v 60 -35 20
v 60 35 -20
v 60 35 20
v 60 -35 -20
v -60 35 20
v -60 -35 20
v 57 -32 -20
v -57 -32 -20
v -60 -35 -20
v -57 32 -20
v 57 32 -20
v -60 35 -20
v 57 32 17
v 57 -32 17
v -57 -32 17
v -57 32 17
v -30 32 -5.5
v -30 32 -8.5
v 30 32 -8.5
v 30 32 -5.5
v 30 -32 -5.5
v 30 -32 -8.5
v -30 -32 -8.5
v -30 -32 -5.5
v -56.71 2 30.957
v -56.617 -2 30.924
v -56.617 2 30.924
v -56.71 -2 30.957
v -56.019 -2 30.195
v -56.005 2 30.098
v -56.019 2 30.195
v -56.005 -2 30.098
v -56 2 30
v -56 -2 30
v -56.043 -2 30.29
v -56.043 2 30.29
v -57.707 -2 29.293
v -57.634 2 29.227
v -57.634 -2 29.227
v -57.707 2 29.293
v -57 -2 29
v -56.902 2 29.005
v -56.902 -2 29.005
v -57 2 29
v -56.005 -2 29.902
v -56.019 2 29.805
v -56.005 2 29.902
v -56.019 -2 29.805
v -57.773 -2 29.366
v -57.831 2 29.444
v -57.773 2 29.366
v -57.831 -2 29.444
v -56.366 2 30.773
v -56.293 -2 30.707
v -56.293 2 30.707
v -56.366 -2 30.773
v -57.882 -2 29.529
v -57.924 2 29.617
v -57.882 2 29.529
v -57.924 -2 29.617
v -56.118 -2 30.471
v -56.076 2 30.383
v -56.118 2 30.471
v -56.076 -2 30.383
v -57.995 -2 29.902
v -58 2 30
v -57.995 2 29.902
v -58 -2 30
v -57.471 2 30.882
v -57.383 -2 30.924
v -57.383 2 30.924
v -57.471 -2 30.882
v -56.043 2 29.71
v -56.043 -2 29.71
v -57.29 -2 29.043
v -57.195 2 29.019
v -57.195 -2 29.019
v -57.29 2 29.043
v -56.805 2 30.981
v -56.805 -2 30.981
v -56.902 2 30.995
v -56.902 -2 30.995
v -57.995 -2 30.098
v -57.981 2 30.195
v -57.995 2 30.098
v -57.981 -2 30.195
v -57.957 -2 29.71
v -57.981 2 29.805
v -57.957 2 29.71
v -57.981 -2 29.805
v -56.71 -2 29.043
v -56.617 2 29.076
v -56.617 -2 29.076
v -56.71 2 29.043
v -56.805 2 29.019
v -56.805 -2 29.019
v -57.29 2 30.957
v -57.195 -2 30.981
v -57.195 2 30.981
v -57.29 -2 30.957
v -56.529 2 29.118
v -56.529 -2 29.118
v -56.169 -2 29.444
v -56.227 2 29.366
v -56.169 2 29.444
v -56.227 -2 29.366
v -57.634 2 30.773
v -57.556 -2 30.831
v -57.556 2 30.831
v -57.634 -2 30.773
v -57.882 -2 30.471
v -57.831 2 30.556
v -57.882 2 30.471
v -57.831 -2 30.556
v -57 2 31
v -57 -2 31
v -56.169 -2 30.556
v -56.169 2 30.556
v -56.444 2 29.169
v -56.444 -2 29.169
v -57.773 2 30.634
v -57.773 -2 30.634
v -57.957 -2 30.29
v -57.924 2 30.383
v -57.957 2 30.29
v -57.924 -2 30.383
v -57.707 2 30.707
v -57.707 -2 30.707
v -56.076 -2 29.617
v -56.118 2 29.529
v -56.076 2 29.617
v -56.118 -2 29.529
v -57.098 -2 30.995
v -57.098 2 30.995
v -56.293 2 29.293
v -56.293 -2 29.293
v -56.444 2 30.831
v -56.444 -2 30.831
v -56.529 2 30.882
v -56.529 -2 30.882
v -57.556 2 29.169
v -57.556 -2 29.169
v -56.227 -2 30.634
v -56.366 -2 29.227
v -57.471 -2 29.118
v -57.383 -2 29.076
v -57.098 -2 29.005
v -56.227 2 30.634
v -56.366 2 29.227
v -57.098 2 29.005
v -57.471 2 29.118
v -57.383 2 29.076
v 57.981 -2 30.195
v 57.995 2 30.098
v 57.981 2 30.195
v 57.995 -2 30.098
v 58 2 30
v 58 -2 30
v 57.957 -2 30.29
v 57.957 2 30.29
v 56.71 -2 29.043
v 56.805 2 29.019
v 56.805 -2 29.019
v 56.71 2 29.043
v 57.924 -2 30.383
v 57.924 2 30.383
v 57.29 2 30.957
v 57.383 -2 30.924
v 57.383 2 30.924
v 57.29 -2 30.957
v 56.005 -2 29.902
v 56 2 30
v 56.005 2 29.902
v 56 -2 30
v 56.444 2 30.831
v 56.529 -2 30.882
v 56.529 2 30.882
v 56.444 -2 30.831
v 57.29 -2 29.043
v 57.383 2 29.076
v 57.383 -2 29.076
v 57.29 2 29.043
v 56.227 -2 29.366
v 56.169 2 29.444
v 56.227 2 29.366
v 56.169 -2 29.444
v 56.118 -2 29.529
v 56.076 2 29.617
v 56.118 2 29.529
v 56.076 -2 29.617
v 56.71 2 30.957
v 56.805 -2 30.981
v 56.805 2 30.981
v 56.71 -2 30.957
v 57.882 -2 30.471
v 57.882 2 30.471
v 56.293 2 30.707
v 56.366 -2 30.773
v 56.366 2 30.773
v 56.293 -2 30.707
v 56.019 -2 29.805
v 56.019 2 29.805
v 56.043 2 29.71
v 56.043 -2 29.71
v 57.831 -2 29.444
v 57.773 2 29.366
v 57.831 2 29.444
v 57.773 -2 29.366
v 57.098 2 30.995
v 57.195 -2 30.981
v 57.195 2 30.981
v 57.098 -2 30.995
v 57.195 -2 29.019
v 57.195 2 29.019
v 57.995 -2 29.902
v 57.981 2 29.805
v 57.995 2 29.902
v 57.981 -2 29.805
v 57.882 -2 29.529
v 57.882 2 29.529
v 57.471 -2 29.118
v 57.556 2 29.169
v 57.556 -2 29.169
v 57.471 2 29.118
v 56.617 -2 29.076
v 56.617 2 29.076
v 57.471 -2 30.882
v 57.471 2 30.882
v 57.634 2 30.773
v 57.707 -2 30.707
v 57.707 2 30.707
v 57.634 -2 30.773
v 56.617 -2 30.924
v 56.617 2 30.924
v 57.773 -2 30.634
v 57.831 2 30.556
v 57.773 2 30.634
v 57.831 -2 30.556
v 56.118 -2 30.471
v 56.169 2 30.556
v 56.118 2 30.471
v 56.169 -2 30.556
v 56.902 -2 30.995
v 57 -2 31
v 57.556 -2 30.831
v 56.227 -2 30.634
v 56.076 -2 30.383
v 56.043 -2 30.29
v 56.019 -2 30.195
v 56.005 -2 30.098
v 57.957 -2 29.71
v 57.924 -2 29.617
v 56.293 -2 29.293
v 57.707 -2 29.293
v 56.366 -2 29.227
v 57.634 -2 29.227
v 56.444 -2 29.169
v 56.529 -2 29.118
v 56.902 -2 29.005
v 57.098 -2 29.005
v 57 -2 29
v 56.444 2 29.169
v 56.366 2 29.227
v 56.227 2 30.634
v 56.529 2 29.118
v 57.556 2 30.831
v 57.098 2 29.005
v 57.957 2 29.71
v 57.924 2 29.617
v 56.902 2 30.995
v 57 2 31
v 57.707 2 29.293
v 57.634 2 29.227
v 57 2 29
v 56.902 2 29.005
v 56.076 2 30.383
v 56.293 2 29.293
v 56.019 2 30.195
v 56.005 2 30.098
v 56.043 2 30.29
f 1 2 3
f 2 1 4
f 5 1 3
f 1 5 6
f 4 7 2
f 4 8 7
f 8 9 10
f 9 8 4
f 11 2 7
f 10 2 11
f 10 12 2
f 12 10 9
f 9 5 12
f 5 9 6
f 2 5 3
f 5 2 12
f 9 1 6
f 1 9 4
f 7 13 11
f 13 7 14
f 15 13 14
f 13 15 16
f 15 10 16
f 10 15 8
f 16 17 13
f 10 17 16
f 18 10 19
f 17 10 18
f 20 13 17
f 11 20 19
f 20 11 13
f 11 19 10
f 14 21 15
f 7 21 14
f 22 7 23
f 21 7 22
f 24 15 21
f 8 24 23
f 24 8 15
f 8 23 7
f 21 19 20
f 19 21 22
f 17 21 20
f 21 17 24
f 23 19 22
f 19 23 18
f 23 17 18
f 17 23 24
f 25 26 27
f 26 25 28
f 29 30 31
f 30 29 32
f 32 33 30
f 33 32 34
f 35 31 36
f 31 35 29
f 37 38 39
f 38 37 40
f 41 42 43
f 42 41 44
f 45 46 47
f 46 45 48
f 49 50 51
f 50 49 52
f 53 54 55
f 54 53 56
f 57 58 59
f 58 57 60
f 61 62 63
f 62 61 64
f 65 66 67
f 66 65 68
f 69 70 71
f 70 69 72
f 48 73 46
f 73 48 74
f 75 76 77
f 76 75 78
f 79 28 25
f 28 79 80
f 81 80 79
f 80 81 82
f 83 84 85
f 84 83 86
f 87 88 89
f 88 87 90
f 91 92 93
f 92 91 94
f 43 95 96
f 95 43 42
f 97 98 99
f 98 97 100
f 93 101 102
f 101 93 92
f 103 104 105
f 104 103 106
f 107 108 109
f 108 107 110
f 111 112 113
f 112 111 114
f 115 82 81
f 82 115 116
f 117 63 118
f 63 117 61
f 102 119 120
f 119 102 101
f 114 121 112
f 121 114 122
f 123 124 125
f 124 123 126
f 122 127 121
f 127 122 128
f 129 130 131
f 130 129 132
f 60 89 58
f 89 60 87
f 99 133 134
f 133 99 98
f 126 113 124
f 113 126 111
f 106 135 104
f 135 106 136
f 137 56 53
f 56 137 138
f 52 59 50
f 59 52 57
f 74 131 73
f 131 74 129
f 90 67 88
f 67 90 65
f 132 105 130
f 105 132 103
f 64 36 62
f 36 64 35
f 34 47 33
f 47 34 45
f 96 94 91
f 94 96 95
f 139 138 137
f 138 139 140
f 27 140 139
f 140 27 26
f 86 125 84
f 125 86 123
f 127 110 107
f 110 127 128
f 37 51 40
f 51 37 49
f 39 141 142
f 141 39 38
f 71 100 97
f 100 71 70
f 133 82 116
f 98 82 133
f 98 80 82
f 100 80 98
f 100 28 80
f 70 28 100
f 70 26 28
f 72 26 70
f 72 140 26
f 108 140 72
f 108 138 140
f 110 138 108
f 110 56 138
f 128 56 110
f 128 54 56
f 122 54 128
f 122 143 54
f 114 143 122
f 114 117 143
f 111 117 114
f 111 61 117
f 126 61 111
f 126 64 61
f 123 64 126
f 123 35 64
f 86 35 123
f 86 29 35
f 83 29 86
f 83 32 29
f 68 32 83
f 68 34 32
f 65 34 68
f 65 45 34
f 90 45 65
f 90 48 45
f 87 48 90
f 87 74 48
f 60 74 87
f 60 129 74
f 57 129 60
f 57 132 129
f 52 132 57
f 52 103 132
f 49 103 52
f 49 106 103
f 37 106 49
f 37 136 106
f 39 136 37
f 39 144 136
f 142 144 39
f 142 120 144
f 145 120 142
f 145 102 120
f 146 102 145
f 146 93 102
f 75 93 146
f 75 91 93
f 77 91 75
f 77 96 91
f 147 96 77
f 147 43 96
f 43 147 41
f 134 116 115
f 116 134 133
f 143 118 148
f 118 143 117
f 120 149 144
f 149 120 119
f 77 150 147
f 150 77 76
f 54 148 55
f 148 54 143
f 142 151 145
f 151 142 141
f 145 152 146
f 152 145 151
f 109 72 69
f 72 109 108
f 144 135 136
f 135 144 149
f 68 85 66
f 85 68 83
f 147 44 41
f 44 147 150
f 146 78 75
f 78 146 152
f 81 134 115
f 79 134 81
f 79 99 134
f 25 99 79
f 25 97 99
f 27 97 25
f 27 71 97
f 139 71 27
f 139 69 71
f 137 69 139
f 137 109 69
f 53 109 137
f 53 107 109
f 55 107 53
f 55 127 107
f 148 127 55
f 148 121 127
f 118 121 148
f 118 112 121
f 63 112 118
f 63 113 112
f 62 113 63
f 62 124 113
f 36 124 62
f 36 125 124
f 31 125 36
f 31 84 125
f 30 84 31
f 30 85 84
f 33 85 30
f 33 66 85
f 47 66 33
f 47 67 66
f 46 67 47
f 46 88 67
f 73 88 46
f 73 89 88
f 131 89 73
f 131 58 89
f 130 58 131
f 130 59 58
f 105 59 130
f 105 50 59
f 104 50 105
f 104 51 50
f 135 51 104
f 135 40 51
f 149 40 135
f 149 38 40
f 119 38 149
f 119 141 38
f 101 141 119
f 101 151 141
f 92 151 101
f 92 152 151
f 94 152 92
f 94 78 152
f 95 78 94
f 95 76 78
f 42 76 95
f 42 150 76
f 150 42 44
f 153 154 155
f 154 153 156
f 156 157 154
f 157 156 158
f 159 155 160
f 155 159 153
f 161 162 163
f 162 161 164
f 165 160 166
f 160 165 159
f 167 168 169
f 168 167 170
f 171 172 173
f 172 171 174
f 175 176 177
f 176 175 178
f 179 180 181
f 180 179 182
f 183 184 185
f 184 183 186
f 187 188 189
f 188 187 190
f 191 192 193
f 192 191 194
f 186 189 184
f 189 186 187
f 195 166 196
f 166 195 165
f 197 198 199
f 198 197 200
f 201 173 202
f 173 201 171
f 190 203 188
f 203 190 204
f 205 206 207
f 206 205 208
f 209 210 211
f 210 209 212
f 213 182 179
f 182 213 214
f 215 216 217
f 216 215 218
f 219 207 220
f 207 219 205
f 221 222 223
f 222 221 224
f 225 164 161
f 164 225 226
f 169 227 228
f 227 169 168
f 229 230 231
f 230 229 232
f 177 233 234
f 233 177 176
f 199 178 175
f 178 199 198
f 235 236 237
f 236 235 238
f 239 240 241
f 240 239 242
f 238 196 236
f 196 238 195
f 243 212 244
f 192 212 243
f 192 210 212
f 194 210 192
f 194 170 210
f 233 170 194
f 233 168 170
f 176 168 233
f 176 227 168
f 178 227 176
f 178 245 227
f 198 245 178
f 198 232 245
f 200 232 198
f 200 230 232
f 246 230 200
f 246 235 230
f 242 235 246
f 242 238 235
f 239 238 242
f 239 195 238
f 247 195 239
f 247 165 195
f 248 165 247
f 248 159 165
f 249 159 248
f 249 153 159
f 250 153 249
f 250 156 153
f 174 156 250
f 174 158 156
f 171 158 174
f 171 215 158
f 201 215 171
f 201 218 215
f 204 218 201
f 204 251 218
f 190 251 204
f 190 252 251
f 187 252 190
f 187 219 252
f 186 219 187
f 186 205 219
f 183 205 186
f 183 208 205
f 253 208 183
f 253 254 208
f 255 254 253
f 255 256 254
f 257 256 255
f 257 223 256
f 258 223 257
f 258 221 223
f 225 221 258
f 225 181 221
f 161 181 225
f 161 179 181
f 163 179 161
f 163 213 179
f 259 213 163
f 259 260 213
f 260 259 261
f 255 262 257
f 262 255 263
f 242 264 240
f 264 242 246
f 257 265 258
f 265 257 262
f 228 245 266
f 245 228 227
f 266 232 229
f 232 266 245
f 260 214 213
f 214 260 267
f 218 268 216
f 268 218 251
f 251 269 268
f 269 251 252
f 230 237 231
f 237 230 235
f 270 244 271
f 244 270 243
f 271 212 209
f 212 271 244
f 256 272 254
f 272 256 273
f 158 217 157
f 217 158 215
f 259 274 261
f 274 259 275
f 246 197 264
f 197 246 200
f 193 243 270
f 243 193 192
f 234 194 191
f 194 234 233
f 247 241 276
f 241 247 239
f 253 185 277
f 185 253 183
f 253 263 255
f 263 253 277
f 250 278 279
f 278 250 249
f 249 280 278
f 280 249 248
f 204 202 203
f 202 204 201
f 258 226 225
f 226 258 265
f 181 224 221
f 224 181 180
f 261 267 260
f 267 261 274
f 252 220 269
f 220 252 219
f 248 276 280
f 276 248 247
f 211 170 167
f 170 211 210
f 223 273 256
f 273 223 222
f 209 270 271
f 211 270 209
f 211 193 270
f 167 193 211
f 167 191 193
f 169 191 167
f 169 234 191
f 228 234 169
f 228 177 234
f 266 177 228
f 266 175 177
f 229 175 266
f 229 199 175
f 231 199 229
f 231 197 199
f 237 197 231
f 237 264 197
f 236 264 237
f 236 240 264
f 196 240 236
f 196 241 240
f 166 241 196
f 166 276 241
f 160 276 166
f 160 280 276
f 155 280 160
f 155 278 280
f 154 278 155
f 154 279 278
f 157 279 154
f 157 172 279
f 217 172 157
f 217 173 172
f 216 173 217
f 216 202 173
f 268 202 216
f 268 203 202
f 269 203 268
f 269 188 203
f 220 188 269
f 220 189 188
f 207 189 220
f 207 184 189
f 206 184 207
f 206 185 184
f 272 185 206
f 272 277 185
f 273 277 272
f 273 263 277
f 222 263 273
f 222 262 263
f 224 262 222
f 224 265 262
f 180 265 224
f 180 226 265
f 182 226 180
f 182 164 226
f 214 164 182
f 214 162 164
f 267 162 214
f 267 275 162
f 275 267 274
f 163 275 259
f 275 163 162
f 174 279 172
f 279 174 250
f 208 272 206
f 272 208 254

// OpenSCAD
// Dimensions in millimetres
outer_x = 120;
outer_y = 70;
outer_z = 40;

wall_thickness = 3;
floor_thickness = 3;

platform_length = 60;
platform_width = outer_y;  // spans full Y
platform_height_above_floor = 10;  // top at z = 13 (floor at z = 3)

hole_diameter = 2;
hole_radius = hole_diameter / 2;
hole_z = 30;  // z-level of hole center
hole_y = 0;   // along Y=0 (end wall)

// Inner dimensions
inner_x = outer_x - 2 * wall_thickness;
inner_y = outer_y - 2 * wall_thickness;
inner_z = outer_z - floor_thickness;

// Platform top at z = 13 (floor at z = 3, so 10 mm above)
platform_top_z = floor_thickness + platform_height_above_floor;

// Platform centered in X
platform_x_start = (outer_x - platform_length) / 2;
platform_x_end = platform_x_start + platform_length;

// Create the main tank body (open top, hollow)
module tank() {
    // Outer box (with floor)
    difference() {
        cube([outer_x, outer_y, outer_z], center = true);
        // Remove inner cavity
        translate([0, 0, -outer_z/2 + inner_z/2]) {
            cube([inner_x, inner_y, inner_z], center = true);
        }
    }
}

// Create the raised platform (solid, centered in X, full Y)
module platform() {
    translate([0, 0, -outer_z/2 + floor_thickness + platform_height_above_floor]) {
        cube([platform_length, platform_width, wall_thickness], center = true);
    }
}

// Create the two end-wall holes (horizontal, along X, at y=0, z=30)
module end_hole() {
    // Hole is horizontal, so we use a cylinder along X
    // Extend slightly beyond the wall to ensure clean cut
    cylinder(r = hole_radius, h = wall_thickness + 1, $fn = 64, center = true);
}

module hole_at_end(x_pos) {
    translate([x_pos, 0, hole_z]) {
        rotate([90, 0, 0]) {
            end_hole();
        }
    }
}

// Main assembly
$fn = 64;

// Build the tank with platform and holes
difference() {
    // Start with the full tank body
    tank();

    // Cut out the platform (so it's hollow except for the solid platform)
    // But we don't want to remove the platform — we want to keep it solid.
    // So instead, we subtract the platform from the tank body only where it's not needed.
    // Actually, we'll build the platform separately and union it.
}

// Union the platform into the tank
union() {
    tank();
    platform();
}

// Now drill the two end holes (through the end walls)
// The holes go through the walls at X = ±(outer_x/2 - wall_thickness) and Y = 0, Z = 30
// We drill from both sides, so we need to cut through the wall at each end

// Left end wall (x = -outer_x/2 + wall_thickness)
hole_at_end(-outer_x/2 + wall_thickness);

// Right end wall (x = +outer_x/2 - wall_thickness)
hole_at_end(outer_x/2 - wall_thickness);
